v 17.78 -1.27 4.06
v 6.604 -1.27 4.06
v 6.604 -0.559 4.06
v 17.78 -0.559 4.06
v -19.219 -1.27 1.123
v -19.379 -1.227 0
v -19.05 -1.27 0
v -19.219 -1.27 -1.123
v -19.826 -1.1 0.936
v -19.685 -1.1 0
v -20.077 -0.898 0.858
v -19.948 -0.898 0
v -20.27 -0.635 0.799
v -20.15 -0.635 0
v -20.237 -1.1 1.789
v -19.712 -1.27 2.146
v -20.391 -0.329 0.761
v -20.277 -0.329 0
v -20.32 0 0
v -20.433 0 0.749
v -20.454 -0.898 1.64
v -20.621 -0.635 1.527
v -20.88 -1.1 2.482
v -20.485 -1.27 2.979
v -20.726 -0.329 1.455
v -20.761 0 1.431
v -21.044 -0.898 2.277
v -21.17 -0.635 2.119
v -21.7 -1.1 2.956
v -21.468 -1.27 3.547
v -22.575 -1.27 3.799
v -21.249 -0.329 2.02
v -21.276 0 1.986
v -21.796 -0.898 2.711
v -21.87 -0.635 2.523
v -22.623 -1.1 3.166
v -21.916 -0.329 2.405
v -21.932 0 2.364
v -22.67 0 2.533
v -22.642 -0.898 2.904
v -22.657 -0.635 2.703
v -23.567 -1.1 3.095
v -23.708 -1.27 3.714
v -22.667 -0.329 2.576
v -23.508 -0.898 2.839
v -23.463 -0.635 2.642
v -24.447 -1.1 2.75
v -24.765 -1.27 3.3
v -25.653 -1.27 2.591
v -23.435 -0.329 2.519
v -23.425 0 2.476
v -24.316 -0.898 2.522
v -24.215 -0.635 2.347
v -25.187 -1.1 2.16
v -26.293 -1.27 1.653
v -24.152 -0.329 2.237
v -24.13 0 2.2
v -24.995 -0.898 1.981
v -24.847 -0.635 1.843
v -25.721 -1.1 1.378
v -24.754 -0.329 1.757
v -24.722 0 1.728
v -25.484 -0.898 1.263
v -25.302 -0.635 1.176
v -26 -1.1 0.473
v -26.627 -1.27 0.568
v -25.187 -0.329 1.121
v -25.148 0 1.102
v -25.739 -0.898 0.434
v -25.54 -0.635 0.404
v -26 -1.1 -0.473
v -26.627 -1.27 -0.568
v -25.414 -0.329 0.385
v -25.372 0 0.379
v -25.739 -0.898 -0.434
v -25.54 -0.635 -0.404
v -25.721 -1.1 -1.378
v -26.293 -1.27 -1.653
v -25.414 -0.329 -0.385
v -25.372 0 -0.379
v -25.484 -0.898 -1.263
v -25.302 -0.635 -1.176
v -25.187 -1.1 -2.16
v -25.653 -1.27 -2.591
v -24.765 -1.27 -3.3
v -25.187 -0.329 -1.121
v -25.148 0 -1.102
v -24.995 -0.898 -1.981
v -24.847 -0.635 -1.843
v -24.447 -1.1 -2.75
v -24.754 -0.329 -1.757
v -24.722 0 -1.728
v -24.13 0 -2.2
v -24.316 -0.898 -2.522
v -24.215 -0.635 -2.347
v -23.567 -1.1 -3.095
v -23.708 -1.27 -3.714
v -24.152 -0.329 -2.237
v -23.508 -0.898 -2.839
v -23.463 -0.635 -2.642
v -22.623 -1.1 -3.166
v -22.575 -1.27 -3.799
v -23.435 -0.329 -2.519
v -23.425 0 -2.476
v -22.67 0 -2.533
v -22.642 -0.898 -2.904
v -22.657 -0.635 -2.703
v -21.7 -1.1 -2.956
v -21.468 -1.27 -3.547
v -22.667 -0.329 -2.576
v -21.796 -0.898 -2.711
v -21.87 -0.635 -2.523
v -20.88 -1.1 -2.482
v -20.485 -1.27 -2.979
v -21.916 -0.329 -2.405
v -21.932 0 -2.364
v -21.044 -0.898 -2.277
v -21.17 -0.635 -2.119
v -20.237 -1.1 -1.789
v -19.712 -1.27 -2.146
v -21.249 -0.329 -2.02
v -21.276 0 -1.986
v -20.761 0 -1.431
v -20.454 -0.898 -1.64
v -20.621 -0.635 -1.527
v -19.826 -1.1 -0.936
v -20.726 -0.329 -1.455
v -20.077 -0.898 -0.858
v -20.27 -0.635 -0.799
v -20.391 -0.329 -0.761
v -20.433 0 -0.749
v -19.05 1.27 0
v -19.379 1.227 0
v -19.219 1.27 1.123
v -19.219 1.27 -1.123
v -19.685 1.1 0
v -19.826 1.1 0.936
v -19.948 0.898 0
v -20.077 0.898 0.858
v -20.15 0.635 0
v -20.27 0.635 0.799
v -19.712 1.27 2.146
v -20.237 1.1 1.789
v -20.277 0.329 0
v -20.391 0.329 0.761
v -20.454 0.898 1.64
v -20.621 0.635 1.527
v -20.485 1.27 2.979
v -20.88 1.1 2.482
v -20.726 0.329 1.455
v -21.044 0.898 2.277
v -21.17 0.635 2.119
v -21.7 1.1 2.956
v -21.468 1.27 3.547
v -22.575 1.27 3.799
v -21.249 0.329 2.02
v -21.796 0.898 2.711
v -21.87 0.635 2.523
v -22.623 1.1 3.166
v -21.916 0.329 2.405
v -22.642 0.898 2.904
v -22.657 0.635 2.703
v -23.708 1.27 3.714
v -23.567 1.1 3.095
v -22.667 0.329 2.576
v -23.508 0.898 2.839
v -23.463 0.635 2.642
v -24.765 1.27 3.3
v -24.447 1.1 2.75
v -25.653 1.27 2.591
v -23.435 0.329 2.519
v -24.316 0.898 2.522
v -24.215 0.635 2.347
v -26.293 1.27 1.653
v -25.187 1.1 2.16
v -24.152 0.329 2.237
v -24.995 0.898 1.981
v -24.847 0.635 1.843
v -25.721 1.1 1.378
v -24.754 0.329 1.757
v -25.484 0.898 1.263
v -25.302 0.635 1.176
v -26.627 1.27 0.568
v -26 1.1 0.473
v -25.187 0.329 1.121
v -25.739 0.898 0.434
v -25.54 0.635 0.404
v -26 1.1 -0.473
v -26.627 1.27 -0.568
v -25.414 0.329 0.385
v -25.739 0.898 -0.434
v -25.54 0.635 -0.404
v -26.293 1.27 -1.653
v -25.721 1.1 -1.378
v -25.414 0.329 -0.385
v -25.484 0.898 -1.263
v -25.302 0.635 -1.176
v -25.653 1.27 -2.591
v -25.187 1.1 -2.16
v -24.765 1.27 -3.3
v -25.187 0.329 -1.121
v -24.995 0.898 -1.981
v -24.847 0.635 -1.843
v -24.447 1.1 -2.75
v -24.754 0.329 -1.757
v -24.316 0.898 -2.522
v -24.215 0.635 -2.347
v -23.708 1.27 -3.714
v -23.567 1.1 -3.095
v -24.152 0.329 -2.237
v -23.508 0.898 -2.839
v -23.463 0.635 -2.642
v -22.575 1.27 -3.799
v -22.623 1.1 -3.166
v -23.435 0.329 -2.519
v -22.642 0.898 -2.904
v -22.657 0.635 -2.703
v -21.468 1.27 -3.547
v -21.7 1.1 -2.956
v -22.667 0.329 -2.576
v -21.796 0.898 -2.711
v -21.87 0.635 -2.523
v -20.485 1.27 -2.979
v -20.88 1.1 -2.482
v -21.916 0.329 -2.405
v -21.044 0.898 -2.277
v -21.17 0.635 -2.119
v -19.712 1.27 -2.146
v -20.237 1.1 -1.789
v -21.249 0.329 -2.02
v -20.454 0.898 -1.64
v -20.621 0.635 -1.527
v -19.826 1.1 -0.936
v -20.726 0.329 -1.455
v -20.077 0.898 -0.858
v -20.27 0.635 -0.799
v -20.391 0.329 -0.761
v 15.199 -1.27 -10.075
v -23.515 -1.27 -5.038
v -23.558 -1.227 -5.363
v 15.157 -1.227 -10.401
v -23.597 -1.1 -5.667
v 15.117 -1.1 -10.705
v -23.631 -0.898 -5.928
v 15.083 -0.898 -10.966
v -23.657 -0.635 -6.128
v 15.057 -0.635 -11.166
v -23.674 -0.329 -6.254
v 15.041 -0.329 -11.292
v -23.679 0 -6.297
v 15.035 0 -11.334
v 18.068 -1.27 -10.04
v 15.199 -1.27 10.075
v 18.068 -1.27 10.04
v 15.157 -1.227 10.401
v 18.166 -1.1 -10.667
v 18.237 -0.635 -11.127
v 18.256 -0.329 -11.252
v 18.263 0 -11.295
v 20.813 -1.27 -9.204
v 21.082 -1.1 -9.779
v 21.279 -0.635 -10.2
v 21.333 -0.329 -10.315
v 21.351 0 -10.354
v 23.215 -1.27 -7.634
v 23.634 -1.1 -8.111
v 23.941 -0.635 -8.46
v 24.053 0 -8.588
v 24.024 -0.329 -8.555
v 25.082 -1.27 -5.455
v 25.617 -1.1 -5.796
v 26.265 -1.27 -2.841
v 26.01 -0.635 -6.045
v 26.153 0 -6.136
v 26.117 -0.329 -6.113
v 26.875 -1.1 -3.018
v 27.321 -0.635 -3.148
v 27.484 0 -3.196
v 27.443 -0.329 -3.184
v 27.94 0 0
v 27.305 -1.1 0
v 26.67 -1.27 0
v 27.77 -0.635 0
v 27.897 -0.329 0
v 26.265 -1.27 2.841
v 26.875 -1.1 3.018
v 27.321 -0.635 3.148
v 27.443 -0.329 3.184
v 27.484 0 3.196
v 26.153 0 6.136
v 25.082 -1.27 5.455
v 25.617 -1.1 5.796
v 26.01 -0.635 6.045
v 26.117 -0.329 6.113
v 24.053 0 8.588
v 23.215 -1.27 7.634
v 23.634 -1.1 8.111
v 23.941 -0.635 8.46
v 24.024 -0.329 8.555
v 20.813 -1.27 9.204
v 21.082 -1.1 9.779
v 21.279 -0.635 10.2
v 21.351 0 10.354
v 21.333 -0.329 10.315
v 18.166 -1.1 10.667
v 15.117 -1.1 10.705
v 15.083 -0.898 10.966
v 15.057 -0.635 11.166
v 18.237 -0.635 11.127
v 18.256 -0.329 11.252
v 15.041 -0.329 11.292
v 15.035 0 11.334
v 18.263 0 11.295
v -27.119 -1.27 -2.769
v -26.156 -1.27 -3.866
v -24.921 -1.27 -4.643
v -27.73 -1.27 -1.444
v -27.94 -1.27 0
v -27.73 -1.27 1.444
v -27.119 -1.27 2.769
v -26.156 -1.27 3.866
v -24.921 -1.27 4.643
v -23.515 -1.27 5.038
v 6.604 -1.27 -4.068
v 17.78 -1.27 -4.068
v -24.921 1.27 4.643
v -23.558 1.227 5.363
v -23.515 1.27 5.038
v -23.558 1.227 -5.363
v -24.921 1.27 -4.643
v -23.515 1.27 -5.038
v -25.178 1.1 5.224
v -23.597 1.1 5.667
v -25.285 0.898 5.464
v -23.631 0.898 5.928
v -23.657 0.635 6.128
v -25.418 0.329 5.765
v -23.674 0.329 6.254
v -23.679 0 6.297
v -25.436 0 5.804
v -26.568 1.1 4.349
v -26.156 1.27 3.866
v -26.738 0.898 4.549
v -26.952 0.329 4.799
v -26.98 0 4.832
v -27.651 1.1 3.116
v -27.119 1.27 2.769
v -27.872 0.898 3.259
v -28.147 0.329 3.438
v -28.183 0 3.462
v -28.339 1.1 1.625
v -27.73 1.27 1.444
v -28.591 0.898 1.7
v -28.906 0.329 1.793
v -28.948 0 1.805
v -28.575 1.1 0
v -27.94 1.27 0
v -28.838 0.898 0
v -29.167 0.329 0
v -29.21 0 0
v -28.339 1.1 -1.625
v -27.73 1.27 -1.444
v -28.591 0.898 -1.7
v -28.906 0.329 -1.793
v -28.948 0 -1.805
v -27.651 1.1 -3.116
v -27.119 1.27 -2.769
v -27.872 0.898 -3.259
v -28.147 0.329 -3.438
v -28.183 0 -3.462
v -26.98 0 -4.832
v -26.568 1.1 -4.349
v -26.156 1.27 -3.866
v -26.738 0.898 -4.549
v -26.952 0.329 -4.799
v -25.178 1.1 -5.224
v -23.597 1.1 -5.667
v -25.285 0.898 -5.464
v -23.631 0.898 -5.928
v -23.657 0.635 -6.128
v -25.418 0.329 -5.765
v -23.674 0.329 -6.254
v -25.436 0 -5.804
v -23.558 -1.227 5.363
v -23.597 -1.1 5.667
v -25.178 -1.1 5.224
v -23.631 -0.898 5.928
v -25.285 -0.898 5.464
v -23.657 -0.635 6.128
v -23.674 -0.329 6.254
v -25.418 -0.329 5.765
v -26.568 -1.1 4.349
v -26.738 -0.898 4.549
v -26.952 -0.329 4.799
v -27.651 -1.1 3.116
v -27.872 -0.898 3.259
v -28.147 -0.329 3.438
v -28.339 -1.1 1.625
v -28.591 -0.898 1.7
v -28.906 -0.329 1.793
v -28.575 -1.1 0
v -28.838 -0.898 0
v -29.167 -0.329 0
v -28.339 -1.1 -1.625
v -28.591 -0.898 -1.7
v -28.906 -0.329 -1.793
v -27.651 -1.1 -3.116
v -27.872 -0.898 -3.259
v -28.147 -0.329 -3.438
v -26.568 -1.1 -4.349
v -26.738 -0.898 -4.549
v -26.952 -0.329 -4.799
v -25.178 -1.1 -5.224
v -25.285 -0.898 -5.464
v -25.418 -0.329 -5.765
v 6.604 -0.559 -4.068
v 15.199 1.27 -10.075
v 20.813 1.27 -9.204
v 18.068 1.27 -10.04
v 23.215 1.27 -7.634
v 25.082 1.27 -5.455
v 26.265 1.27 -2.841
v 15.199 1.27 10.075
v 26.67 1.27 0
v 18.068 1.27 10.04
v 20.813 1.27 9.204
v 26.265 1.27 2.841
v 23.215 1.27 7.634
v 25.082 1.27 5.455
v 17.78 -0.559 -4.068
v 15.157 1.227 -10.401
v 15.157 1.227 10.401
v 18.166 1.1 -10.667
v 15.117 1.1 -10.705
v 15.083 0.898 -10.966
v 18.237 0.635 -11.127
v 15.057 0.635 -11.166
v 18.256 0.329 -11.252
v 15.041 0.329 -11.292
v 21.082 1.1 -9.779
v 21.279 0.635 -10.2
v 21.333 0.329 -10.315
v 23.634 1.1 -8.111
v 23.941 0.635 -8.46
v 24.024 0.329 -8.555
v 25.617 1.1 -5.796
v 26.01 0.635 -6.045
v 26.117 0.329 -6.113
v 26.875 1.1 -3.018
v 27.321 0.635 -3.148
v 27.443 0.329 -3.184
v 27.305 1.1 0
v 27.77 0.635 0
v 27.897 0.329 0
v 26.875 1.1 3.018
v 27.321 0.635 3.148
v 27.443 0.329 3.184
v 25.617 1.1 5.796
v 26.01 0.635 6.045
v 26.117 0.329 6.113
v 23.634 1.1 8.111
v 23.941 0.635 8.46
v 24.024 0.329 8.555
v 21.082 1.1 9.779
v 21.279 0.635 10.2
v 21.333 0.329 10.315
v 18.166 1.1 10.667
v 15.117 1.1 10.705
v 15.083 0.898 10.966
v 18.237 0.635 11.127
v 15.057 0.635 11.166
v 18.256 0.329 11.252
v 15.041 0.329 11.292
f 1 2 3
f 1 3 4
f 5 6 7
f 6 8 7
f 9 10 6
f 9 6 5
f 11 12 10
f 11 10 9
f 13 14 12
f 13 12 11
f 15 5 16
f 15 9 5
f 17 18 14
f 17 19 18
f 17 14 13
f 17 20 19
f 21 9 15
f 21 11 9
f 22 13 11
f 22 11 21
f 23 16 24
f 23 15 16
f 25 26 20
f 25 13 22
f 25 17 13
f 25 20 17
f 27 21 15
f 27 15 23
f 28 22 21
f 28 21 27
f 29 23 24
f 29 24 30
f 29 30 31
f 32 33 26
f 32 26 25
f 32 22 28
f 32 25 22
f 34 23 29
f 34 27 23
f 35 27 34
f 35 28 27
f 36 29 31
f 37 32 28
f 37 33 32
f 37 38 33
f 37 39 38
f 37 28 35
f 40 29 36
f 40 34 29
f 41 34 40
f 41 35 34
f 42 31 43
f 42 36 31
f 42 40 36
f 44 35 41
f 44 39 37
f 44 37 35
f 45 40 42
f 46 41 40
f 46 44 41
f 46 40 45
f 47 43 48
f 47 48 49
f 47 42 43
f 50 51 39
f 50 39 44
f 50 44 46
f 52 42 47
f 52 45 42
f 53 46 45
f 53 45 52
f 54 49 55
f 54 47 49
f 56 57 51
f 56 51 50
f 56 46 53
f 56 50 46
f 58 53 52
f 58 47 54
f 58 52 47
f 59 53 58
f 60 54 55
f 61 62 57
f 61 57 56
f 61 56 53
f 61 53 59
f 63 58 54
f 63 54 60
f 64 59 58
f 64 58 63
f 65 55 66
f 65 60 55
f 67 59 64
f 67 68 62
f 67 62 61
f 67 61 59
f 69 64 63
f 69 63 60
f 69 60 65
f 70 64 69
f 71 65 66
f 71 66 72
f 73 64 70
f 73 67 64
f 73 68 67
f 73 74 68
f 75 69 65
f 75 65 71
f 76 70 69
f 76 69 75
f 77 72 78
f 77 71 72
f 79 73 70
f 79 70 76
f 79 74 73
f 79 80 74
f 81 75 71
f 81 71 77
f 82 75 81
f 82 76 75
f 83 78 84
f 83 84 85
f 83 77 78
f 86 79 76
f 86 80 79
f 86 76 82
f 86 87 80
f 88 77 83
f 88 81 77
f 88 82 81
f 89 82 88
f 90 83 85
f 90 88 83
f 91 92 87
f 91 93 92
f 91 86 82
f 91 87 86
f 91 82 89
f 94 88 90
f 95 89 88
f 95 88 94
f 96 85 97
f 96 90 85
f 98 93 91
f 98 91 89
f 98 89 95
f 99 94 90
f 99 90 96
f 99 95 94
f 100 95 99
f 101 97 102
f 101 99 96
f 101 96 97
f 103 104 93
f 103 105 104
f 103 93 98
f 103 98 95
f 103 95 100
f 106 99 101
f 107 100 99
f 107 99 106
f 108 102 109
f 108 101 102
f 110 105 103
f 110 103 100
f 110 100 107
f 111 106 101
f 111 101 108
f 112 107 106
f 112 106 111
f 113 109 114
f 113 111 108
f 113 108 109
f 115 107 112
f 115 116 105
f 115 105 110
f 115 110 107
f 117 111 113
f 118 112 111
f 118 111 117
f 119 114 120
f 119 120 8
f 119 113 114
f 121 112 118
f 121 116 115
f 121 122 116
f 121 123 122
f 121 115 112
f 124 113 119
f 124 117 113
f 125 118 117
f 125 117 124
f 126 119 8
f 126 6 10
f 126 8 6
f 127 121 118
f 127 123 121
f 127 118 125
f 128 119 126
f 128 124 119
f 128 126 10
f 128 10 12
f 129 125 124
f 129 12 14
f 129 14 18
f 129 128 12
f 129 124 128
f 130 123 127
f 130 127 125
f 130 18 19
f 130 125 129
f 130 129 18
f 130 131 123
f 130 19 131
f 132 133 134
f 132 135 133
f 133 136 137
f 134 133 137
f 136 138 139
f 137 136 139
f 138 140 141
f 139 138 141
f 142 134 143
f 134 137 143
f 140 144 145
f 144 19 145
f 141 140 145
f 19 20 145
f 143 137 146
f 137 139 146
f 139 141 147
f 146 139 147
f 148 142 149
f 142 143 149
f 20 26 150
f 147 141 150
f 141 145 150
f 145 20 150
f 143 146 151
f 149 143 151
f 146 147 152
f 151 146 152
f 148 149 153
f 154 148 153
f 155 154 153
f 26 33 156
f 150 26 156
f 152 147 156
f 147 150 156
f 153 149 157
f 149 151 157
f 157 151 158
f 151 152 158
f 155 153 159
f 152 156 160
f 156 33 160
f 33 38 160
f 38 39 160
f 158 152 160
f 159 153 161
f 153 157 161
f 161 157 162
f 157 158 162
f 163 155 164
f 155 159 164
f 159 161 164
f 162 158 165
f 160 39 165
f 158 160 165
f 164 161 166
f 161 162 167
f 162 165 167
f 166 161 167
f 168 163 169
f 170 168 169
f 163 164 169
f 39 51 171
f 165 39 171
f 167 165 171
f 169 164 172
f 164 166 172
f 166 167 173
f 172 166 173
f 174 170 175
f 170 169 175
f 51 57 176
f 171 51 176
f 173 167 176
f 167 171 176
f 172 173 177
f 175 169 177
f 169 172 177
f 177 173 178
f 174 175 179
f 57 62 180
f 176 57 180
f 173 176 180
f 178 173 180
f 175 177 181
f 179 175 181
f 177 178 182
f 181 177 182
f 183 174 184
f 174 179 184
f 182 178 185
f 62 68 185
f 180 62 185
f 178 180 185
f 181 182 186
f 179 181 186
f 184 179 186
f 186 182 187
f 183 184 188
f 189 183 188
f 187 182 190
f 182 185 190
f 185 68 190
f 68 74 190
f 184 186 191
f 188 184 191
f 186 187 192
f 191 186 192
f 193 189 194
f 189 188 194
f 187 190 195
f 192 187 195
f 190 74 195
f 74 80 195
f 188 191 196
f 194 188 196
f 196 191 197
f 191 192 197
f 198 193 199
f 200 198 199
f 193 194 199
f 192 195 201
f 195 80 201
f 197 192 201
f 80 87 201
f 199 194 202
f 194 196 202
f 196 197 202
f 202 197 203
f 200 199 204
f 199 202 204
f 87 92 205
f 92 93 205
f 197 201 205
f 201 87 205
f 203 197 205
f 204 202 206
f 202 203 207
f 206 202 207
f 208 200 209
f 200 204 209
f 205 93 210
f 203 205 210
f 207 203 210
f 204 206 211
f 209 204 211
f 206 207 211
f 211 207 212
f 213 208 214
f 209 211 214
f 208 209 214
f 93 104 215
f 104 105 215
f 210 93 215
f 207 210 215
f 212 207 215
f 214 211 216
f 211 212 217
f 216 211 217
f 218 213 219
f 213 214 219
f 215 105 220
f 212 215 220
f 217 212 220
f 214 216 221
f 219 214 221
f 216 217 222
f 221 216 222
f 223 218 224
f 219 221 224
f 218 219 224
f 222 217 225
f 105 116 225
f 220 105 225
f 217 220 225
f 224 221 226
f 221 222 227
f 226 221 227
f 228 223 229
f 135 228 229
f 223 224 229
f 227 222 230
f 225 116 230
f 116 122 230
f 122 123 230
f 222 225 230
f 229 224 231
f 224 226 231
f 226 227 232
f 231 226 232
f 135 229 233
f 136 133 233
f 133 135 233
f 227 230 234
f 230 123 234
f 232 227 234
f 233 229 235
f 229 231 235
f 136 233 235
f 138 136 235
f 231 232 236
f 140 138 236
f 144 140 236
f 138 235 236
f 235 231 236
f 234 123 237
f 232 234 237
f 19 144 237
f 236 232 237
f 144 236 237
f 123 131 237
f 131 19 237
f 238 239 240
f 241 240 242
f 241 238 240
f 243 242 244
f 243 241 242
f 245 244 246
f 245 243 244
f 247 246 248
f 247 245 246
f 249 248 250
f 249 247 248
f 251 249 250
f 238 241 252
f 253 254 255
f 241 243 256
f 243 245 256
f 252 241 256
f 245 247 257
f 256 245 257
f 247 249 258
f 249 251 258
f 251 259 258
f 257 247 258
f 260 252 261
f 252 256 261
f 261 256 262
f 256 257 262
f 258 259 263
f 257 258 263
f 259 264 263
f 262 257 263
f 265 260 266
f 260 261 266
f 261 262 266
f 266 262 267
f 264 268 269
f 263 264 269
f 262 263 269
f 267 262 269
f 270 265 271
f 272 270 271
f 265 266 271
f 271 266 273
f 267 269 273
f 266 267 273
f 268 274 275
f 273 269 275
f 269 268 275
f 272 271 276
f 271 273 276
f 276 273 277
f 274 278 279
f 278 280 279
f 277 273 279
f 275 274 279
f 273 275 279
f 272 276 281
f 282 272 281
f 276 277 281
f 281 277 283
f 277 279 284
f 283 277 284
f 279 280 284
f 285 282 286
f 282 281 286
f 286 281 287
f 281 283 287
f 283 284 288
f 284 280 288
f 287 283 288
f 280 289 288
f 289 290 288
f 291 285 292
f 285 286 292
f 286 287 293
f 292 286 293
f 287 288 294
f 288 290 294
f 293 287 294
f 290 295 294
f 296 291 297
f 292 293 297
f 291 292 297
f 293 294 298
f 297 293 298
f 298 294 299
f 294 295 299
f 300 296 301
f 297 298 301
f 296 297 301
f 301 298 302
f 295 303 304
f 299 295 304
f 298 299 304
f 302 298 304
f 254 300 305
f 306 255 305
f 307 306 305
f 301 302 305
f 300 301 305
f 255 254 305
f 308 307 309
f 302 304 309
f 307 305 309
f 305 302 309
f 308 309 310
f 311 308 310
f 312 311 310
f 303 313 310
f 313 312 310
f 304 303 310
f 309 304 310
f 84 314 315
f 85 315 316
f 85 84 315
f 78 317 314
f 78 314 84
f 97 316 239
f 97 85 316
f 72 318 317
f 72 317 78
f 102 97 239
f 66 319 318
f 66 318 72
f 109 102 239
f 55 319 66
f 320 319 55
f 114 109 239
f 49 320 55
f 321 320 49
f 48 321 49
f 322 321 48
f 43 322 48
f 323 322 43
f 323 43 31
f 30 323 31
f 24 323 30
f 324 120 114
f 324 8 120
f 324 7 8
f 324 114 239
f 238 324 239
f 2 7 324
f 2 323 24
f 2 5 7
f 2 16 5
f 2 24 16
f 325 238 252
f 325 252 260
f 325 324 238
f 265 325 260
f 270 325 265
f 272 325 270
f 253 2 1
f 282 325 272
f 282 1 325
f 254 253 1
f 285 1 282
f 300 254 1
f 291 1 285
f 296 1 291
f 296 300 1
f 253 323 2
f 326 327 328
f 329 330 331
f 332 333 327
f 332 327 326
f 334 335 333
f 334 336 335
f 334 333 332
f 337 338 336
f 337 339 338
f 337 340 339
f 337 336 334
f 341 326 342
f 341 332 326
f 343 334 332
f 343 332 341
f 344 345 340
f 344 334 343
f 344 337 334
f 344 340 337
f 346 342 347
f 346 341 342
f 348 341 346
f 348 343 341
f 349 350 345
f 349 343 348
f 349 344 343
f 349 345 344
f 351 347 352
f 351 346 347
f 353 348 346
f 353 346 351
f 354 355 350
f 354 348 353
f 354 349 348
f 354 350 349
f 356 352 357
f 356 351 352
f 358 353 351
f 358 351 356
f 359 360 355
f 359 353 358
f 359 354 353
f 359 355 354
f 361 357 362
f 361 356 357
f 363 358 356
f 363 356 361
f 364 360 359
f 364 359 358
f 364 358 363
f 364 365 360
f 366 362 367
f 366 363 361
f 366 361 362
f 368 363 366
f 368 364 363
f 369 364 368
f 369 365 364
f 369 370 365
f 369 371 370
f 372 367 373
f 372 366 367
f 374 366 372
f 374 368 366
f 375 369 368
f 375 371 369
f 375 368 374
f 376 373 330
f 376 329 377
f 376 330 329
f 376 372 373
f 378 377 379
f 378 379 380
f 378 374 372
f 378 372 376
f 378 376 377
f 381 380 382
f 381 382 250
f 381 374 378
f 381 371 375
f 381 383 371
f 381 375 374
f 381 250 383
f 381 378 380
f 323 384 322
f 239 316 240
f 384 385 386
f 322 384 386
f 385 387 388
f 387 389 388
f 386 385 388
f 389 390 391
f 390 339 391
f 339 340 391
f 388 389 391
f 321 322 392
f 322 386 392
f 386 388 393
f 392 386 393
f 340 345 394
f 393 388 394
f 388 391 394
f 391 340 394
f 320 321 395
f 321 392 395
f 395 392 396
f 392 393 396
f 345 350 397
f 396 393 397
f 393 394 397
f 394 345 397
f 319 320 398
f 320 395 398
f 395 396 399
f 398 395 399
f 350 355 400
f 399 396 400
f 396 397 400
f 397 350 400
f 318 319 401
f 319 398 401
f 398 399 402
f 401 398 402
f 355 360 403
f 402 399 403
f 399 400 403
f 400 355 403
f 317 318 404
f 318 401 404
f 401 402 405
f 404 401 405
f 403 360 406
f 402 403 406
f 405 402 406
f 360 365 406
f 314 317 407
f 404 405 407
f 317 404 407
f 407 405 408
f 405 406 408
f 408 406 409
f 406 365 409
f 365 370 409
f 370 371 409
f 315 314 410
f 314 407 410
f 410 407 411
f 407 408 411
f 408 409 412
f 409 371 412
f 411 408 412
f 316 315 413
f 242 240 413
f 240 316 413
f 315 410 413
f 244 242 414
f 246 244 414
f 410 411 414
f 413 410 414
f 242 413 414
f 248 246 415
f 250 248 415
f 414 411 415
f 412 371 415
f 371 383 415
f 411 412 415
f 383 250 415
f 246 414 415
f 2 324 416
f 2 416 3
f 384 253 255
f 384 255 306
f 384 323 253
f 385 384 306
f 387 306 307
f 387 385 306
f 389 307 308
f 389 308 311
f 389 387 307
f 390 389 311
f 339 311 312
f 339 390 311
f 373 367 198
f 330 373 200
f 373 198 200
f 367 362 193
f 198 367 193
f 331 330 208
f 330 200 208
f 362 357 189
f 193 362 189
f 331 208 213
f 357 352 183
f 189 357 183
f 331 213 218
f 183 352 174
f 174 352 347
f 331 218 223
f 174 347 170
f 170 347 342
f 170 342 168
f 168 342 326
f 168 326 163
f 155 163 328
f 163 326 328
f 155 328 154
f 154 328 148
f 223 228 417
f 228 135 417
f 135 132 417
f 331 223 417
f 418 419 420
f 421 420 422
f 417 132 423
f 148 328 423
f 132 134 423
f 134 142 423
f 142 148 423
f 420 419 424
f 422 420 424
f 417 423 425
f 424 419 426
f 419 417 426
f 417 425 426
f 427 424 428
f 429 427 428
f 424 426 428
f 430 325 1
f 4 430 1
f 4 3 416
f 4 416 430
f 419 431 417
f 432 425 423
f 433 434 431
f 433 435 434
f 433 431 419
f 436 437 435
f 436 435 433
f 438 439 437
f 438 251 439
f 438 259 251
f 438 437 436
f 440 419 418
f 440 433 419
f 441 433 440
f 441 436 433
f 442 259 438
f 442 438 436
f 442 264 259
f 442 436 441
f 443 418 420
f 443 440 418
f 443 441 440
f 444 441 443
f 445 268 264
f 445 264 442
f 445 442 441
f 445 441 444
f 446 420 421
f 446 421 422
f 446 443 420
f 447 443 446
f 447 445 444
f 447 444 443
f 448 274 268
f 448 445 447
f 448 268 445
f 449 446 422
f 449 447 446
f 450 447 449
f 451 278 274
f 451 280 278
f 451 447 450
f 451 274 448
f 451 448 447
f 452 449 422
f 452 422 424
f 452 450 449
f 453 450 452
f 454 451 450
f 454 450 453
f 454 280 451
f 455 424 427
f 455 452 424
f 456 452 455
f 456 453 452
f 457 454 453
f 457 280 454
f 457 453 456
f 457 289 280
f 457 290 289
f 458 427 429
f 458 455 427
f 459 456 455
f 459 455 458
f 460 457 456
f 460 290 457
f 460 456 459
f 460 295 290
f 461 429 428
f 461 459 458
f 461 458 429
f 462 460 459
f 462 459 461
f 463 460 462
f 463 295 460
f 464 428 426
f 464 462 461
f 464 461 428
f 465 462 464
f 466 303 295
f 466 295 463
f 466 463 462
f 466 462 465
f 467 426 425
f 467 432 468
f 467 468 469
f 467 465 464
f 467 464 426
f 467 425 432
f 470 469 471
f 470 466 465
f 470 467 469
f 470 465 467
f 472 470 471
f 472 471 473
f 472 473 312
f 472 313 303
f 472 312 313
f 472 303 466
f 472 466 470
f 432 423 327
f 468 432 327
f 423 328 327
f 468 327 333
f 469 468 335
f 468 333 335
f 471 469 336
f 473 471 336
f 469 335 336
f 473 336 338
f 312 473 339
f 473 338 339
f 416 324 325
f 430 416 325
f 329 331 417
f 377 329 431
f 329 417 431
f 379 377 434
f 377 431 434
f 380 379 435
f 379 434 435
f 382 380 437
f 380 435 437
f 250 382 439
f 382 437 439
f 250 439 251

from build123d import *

# Parameters (mm, degrees)
F1_DEPTH = 1.27
F2_R     = 2.54
F3_DEPTH = 25.4
F4_R     = 1.26999
F5_W     = 11.176
F5_H     = 8.128
F6_DEPTH = 0.7112


# Not quite as in the source:
# - a fillet or chamfer is up to 0.001 mm smaller than in the source, because OpenCascade refuses the exact size


with BuildPart() as f1:
    # F0 (on Front) → F1 (new body, symmetric)
    with BuildSketch(Plane.XZ):
        with BuildLine():
            ThreePointArc((-23.6793548387, -6.2969165191), (-18.6695586883, -4.7710273121), (-16.51, 0))
            ThreePointArc((-16.51, 0), (-18.6695586883, 4.7710273121), (-23.6793548387, 6.2969165191))
            ThreePointArc((-23.6793548387, 6.2969165191), (-29.21, 0), (-23.6793548387, -6.2969165191))
        make_face()
        with BuildLine():
            ThreePointArc((-23.6793548387, 6.2969165191), (-18.6695586883, 4.7710273121), (-16.51, 0))
            ThreePointArc((-16.51, 0), (-18.6695586883, -4.7710273121), (-23.6793548387, -6.2969165191))
            Line((-23.6793548387, -6.2969165191), (15.0351612903, -11.3344497343))
            ThreePointArc((15.0351612903, -11.3344497343), (5.08, 0), (15.0351612903, 11.3344497343))
            Line((15.0351612903, 11.3344497343), (-23.6793548387, 6.2969165191))
        make_face()
        with BuildLine():
            ThreePointArc((27.94, 0), (24.0527943611, 8.5878491618), (15.0351612903, 11.3344497343))
            ThreePointArc((15.0351612903, 11.3344497343), (5.08, 0), (15.0351612903, -11.3344497343))
            ThreePointArc((15.0351612903, -11.3344497343), (24.0527943611, -8.5878491618), (27.94, 0))
        make_face()
    extrude(amount=F1_DEPTH, both=True)

    # F2 (on face) → F3 (cut, symmetric)
    with BuildSketch(Plane.XZ.offset(1.27)):
        with Locations((-22.86, 0)):
            Circle(F2_R)
    extrude(amount=F3_DEPTH, both=True, mode=Mode.SUBTRACT)

    # F4 (radius 1.27 in the source; OpenCascade refuses exactly that, so slightly less here)
    f4_edges = [f1.edges().sort_by_distance(p)[0] for p in [
        (-4.322097, -1.27, 8.815683),
        (-4.322097, 1.27, 8.815683),
        (27.94, -1.27, 0),
        (15.035161, 0, -11.33445),
        (27.94, 1.27, 0),
        (15.035161, 0, 11.33445),
        (-29.21, -1.27, 0),
        (-25.4, 1.27, 0),
        (-25.4, -1.27, 0),
        (-29.21, 1.27, 0),
    ]]
    fillet(f4_edges, radius=F4_R)

    # F5 (on face) → F6 (cut)
    with BuildSketch(Plane.XZ.offset(1.27)):
        with Locations((12.192, -0.0039664305)):
            Rectangle(F5_W, F5_H)
    extrude(amount=-F6_DEPTH, mode=Mode.SUBTRACT)


solid = f1.part
